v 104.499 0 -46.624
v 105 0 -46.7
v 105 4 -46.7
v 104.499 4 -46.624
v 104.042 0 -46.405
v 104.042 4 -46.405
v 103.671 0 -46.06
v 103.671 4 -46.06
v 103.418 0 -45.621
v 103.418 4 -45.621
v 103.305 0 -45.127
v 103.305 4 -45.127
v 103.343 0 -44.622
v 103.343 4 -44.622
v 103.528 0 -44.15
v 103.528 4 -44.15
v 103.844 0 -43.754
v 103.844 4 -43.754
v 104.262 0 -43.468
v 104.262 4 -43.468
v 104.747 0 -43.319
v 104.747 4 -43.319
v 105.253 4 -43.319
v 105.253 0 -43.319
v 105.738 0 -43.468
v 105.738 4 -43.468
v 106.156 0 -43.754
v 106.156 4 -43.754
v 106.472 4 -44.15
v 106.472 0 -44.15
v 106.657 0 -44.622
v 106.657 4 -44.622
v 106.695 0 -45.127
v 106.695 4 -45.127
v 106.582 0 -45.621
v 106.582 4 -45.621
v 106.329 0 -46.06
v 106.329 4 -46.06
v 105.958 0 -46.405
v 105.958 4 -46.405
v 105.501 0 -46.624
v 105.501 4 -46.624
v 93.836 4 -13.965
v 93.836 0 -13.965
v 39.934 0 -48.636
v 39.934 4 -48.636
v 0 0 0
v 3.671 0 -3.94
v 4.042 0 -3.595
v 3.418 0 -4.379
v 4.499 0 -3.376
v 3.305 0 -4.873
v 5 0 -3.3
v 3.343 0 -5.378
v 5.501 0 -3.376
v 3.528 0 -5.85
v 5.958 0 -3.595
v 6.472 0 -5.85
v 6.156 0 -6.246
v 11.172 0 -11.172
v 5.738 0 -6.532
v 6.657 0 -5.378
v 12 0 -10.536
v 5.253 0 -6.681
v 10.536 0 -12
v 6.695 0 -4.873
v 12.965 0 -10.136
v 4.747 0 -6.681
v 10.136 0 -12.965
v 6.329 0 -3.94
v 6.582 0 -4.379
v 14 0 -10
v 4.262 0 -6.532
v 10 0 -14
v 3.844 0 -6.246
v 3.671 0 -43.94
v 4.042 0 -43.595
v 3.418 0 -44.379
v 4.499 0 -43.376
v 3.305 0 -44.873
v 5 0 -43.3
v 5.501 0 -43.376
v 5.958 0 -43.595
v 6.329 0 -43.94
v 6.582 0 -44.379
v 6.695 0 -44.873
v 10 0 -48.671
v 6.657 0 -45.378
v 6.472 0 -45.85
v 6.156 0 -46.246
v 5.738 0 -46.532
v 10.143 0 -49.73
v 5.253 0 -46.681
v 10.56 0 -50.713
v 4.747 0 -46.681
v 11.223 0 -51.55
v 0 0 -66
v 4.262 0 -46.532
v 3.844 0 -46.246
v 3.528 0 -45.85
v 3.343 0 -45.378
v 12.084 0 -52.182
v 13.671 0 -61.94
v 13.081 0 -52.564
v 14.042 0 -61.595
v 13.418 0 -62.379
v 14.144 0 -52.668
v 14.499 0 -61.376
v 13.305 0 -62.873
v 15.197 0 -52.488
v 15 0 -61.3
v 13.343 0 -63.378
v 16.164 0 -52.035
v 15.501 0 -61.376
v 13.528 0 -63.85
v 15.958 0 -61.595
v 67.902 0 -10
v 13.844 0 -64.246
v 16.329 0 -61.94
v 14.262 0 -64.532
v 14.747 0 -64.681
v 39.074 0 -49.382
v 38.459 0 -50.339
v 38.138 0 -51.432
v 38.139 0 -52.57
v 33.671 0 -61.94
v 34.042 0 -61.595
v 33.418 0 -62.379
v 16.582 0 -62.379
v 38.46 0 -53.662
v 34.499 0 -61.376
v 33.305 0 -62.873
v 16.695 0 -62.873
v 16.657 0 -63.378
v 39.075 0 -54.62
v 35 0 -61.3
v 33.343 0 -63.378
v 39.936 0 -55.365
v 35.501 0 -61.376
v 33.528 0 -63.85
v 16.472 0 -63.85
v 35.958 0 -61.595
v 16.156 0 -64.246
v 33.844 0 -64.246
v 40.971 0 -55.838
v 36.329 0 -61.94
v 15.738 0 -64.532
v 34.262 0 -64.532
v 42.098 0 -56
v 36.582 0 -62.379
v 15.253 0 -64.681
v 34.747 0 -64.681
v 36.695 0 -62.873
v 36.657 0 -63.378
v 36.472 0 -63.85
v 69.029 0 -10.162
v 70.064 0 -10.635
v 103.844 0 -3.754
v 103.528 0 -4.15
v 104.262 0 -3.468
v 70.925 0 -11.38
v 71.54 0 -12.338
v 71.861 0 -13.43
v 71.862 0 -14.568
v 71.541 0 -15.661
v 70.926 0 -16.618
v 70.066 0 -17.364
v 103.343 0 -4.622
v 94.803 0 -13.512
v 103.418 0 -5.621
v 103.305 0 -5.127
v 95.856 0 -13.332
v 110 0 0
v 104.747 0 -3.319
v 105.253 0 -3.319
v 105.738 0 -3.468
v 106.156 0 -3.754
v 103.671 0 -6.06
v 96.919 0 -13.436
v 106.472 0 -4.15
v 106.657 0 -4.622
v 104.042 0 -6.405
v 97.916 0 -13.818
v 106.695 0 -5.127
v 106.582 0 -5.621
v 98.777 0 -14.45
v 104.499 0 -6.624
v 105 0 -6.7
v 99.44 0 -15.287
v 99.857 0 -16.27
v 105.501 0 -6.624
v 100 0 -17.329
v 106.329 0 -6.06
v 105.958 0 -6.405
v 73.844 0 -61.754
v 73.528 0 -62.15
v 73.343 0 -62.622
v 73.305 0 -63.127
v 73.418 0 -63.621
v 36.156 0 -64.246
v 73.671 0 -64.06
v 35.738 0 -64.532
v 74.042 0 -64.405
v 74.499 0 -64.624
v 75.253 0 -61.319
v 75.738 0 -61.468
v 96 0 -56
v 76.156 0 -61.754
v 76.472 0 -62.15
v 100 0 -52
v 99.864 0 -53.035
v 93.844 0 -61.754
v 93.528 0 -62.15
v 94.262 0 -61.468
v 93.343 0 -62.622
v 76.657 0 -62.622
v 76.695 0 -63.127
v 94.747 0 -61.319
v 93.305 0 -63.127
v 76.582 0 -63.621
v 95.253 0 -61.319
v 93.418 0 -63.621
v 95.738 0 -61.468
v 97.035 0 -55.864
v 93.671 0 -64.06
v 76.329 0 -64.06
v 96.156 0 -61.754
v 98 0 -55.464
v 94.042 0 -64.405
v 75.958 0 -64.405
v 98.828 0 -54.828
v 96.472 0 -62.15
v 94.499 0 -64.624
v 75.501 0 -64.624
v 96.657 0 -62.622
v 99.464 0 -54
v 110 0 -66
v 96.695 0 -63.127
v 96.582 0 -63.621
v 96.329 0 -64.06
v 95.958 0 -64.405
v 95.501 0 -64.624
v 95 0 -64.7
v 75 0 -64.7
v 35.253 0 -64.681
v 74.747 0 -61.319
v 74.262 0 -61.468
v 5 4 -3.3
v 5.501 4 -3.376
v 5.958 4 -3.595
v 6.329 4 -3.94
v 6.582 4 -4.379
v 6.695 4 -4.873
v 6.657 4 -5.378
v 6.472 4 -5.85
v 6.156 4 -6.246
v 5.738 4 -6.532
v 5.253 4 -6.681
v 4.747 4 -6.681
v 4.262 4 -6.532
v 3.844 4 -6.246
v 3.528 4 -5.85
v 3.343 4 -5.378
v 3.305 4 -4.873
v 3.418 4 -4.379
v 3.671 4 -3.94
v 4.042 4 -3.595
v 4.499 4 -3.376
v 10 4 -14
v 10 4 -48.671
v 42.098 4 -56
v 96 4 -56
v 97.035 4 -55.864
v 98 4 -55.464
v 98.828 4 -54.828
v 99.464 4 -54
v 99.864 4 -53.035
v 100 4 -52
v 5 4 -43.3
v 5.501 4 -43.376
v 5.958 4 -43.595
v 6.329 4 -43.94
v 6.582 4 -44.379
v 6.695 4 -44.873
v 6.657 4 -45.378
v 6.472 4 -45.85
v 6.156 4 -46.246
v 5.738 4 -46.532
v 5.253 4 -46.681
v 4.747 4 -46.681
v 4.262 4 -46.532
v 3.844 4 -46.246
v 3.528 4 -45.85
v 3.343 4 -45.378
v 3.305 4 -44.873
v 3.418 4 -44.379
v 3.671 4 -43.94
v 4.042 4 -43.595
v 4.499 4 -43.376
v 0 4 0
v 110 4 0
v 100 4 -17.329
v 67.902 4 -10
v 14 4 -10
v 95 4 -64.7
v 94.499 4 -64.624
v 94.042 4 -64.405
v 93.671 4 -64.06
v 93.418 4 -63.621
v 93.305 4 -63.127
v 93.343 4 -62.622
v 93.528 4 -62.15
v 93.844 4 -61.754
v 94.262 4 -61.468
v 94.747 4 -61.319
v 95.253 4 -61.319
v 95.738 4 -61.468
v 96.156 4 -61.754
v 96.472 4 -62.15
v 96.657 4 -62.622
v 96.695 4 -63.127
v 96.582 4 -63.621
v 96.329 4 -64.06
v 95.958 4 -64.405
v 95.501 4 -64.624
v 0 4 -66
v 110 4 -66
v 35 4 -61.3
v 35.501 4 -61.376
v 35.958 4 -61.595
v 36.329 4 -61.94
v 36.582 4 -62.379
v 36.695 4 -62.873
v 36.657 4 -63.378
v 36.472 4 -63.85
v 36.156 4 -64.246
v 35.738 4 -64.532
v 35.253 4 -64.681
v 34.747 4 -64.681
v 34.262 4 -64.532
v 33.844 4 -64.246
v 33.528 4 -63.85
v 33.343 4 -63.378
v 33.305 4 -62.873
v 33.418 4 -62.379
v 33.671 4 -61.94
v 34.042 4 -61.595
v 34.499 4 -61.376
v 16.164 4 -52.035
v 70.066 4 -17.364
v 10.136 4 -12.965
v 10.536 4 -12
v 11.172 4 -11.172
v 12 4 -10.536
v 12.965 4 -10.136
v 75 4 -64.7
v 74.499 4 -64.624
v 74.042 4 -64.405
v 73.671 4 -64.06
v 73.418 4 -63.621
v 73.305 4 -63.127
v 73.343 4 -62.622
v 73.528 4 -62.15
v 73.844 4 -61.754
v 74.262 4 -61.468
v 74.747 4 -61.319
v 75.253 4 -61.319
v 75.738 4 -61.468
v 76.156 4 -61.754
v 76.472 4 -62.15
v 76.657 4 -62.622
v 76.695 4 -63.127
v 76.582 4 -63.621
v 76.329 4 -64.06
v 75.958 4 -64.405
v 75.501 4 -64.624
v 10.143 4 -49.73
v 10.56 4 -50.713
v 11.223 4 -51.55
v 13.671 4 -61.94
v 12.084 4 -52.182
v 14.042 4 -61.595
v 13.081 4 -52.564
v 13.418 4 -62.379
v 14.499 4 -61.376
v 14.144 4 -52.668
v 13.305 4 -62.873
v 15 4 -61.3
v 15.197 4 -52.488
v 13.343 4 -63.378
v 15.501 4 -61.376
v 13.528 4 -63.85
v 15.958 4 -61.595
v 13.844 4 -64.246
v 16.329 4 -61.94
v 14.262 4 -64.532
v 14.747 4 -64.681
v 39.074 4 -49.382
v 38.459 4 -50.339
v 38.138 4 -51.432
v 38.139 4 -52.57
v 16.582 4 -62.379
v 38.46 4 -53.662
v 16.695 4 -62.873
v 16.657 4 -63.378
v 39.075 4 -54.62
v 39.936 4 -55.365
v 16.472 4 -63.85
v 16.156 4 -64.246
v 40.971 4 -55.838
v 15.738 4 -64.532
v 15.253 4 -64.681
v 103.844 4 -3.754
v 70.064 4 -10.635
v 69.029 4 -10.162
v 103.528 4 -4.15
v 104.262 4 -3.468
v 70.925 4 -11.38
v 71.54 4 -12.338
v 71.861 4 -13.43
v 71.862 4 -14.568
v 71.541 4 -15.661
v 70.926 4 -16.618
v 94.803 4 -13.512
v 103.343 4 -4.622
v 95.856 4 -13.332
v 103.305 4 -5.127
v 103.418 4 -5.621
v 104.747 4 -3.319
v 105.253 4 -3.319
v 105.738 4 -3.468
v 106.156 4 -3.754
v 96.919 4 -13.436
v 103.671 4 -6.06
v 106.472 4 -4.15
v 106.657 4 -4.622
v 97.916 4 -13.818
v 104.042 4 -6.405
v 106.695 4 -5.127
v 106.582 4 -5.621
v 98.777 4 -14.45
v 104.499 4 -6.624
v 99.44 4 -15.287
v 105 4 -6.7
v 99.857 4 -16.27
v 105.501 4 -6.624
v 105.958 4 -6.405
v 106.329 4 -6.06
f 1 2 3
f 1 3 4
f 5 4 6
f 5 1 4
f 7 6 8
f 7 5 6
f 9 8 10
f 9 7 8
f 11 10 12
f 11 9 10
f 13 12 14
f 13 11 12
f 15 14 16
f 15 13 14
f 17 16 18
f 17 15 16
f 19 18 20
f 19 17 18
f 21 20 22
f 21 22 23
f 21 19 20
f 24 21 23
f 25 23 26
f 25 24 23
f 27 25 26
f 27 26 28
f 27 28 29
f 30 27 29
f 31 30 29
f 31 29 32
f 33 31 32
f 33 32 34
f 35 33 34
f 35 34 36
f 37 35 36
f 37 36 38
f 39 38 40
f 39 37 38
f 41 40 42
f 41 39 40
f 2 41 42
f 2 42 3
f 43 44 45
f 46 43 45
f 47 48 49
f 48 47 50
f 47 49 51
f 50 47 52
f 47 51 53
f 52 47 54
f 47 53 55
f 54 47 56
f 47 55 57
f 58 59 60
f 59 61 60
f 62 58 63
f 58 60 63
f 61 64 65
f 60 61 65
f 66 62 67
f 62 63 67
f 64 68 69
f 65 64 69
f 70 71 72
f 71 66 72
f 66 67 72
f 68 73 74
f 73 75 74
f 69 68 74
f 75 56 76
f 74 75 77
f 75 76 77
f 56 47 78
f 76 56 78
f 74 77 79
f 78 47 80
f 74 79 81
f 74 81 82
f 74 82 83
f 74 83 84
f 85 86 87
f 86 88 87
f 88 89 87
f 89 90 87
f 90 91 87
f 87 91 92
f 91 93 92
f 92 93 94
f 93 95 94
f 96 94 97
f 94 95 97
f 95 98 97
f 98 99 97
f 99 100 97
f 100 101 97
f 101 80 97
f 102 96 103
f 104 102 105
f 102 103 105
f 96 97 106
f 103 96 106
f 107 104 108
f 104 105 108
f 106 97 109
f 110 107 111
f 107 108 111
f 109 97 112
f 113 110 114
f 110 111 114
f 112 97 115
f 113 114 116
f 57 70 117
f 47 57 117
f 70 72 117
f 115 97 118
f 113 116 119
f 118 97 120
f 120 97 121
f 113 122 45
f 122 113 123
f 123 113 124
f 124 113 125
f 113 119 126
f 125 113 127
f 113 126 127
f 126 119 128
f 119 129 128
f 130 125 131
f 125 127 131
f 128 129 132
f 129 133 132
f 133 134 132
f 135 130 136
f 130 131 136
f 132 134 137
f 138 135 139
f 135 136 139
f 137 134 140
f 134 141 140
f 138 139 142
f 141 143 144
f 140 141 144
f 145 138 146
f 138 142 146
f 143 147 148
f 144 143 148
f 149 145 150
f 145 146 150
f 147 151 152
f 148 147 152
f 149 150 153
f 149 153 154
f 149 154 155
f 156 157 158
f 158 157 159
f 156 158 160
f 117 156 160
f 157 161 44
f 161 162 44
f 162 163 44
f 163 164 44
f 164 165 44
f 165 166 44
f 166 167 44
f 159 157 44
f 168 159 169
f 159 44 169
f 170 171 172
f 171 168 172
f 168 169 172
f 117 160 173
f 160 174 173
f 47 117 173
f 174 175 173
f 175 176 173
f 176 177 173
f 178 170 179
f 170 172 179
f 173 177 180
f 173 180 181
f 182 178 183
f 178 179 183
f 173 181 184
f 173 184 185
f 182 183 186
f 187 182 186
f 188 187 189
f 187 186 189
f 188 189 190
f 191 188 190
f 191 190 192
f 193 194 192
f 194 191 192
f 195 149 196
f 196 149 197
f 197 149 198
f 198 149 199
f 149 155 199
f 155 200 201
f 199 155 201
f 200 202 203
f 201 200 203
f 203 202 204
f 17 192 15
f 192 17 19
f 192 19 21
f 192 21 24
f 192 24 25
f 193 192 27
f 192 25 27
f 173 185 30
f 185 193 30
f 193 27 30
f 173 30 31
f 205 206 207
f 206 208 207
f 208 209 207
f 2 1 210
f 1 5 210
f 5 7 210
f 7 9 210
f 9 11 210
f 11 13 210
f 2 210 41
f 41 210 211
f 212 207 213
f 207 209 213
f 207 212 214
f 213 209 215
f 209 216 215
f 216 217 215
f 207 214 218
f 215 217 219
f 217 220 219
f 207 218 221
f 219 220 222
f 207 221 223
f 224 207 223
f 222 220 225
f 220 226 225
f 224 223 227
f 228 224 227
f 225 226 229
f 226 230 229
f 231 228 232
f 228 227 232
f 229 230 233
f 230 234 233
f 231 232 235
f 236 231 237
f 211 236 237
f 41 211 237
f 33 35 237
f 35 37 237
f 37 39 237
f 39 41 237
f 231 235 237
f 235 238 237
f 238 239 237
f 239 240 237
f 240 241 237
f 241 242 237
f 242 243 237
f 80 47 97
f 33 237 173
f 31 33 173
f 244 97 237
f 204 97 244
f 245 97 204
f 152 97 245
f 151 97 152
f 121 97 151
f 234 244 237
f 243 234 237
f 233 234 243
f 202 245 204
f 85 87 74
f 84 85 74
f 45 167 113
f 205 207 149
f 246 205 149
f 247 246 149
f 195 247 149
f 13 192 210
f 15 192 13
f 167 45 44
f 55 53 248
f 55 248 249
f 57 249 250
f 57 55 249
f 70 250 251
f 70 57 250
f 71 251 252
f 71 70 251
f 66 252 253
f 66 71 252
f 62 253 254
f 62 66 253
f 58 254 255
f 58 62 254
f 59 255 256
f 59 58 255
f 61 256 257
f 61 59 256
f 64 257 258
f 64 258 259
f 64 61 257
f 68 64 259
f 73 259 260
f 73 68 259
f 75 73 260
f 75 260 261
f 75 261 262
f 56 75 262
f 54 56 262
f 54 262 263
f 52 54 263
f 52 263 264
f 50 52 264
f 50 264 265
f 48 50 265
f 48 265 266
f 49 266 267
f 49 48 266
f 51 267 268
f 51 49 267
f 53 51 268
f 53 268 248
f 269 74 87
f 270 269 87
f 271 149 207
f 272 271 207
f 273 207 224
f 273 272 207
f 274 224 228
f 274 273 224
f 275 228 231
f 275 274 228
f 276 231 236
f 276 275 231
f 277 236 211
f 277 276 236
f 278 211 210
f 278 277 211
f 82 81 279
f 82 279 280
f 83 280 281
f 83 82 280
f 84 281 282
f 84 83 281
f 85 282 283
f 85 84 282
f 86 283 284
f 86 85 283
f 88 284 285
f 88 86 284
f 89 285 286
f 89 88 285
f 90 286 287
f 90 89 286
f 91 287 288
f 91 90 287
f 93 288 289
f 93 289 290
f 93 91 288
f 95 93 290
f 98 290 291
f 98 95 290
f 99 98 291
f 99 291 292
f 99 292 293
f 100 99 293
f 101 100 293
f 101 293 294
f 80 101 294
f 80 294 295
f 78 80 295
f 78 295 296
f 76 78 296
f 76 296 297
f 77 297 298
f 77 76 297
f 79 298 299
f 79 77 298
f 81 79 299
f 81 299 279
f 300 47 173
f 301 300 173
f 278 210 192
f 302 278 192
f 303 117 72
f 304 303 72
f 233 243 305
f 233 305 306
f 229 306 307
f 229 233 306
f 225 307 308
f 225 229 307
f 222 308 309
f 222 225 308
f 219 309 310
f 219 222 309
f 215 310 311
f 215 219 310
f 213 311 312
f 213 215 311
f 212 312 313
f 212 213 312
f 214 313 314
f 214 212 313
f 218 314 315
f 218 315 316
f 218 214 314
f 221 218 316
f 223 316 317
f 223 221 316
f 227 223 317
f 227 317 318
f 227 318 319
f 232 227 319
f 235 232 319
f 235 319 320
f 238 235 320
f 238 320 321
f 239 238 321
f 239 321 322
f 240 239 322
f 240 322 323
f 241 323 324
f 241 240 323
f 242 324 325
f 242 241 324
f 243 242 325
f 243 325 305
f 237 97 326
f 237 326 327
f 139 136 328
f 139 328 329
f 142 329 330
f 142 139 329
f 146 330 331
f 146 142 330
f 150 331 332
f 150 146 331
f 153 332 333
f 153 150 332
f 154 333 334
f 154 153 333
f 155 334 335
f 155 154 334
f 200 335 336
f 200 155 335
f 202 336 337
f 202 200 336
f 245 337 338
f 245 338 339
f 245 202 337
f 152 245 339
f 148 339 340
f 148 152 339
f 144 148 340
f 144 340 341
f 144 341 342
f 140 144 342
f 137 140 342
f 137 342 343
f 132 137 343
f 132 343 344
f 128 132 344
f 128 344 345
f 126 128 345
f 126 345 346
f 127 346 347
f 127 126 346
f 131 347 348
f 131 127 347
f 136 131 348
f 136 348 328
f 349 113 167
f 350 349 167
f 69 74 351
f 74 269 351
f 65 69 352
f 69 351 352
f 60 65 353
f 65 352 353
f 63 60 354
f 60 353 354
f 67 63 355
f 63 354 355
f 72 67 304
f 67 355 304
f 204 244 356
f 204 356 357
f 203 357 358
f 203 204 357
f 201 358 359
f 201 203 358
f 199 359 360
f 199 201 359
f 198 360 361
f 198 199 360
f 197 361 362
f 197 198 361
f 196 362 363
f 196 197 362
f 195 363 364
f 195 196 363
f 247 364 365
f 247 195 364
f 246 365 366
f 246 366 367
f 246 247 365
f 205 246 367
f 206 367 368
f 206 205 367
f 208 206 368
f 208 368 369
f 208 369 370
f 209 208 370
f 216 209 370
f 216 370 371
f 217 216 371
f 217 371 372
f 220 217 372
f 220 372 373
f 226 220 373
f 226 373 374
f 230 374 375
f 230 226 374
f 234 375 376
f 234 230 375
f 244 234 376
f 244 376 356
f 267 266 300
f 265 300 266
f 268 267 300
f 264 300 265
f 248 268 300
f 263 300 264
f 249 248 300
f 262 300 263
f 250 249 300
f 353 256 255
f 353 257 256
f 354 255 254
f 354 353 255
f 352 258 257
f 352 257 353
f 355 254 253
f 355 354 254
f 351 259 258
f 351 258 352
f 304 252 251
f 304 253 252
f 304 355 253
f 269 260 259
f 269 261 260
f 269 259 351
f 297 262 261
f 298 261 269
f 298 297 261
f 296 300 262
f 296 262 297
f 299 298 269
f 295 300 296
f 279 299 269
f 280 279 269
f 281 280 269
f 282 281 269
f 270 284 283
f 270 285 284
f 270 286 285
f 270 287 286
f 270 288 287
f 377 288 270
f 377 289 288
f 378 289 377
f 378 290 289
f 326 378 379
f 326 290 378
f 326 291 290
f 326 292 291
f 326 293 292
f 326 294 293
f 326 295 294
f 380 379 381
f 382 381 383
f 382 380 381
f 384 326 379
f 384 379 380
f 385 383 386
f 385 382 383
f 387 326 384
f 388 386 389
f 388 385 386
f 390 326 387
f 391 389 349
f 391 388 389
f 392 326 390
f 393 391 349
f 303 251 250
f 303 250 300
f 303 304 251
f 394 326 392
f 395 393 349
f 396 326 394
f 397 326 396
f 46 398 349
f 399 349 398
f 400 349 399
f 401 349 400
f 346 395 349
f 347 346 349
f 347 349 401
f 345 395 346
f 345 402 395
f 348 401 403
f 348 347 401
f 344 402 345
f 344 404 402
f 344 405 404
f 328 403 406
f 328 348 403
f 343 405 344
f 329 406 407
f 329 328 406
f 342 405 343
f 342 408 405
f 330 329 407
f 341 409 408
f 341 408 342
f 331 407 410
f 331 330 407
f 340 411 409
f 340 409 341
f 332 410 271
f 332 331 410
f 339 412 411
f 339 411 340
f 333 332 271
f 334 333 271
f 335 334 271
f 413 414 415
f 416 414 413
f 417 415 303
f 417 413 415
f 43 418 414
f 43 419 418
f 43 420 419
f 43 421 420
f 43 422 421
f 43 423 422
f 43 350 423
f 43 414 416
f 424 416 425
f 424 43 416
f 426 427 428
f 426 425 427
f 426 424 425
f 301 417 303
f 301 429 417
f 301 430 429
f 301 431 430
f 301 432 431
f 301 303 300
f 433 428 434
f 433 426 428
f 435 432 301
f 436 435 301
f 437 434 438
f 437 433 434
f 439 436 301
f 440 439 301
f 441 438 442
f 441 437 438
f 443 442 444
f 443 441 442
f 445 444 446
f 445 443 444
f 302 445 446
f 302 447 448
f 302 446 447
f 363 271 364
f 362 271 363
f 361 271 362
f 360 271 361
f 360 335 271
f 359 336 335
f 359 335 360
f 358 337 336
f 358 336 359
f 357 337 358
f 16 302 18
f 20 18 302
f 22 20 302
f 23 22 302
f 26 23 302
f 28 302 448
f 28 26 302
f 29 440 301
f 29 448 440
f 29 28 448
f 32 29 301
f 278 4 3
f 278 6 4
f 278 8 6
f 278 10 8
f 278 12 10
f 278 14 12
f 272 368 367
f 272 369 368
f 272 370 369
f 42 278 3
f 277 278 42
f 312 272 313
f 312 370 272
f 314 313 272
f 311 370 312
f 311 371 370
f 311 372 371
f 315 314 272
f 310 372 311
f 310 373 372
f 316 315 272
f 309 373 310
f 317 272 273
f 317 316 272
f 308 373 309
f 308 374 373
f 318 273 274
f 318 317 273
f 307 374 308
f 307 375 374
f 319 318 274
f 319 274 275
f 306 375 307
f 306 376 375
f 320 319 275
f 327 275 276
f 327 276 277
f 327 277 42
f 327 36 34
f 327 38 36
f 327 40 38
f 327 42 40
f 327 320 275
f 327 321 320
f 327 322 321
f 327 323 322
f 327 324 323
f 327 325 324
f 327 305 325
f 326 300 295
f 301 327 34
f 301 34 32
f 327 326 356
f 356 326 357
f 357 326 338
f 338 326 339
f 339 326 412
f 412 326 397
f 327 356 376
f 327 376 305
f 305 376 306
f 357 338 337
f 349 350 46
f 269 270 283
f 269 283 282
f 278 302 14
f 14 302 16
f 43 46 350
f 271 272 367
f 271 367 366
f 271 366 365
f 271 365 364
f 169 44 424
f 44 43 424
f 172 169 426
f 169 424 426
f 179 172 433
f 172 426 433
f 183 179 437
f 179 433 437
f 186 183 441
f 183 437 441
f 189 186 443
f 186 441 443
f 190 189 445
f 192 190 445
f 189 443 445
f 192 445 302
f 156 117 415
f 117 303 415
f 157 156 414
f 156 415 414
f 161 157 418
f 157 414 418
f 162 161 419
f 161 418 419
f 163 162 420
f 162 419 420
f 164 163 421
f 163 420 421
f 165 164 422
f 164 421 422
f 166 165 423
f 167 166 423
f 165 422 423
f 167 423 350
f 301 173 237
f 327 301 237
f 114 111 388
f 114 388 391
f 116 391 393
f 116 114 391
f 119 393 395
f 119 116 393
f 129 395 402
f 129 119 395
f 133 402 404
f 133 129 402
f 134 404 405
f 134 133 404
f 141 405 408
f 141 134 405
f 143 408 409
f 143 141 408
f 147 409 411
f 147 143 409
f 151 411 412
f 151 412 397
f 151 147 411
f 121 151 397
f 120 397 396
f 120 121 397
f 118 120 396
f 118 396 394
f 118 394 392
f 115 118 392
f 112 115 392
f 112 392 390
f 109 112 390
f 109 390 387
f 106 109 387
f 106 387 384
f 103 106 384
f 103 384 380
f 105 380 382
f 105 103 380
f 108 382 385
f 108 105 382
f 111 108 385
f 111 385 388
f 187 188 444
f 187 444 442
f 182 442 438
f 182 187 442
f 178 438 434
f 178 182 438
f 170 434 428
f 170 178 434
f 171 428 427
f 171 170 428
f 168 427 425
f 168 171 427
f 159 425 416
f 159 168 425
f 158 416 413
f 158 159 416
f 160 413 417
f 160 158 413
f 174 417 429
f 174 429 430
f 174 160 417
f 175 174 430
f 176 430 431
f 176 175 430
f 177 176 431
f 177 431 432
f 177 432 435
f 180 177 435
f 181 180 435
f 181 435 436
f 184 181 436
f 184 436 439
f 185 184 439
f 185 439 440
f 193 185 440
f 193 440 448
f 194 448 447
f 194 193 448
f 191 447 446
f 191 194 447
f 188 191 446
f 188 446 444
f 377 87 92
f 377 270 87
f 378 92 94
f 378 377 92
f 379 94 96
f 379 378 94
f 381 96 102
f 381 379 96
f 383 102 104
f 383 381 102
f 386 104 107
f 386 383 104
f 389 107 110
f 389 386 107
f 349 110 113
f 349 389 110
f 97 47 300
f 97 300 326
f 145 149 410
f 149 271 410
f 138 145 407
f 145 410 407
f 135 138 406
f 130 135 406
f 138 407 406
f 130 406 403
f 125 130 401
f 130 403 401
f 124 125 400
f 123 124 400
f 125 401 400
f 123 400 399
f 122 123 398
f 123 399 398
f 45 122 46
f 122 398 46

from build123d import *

# Parameters (mm, degrees)
SKETCH_1_W          = 110
SKETCH_1_H          = 66
SKETCH_1_R          = 1.7
EXTRUDE_1_DEPTH     = 4
CUT_EXTRUDE_1_DEPTH = 10
FILLET_1_R          = 4


with BuildPart() as part:
    # 草图1 → 凸台-拉伸1 (new body)
    with BuildSketch(Plane(origin=(0, 0, 0), x_dir=(1, 0, 0), z_dir=(0, 1, 0))):
        with Locations((55, 33)):
            Rectangle(SKETCH_1_W, SKETCH_1_H)
        with Locations(Location((5, 45, 0), (0, 0, 270))):
            Circle(SKETCH_1_R, mode=Mode.SUBTRACT)
        with Locations(Location((5, 5, 0), (0, 0, 270))):
            Circle(SKETCH_1_R, mode=Mode.SUBTRACT)
        with Locations(Location((105, 5, 0), (0, 0, 90))):
            Circle(SKETCH_1_R, mode=Mode.SUBTRACT)
        with Locations(Location((105, 45, 0), (0, 0, 90))):
            Circle(SKETCH_1_R, mode=Mode.SUBTRACT)
        with Locations(Location((15, 63, 0), (0, 0, 270))):
            Circle(SKETCH_1_R, mode=Mode.SUBTRACT)
        with Locations(Location((35, 63, 0), (0, 0, 270))):
            Circle(SKETCH_1_R, mode=Mode.SUBTRACT)
        with Locations(Location((75, 63, 0), (0, 0, 90))):
            Circle(SKETCH_1_R, mode=Mode.SUBTRACT)
        with Locations(Location((95, 63, 0), (0, 0, 90))):
            Circle(SKETCH_1_R, mode=Mode.SUBTRACT)
    extrude(amount=EXTRUDE_1_DEPTH)

    # 草图2 → 切除-拉伸1 (cut)
    with BuildSketch(Plane.XZ):
        Polygon((100, -56), (100, -10), (28.485134293, -56), align=None)
        Polygon((10, -56), (81.514865707, -10), (10, -10), align=None)
    extrude(amount=-CUT_EXTRUDE_1_DEPTH, mode=Mode.SUBTRACT)

    # 圆角1
    fillet_1_edges = [part.edges().sort_by_distance(p)[0] for p in [
        (10, 2, -56),
        (10, 2, -10),
        (81.514865707, 2, -10),
        (100, 2, -56),
        (28.485134293, 2, -56),
        (100, 2, -10),
    ]]
    fillet(fillet_1_edges, radius=FILLET_1_R)


solid = part.part
